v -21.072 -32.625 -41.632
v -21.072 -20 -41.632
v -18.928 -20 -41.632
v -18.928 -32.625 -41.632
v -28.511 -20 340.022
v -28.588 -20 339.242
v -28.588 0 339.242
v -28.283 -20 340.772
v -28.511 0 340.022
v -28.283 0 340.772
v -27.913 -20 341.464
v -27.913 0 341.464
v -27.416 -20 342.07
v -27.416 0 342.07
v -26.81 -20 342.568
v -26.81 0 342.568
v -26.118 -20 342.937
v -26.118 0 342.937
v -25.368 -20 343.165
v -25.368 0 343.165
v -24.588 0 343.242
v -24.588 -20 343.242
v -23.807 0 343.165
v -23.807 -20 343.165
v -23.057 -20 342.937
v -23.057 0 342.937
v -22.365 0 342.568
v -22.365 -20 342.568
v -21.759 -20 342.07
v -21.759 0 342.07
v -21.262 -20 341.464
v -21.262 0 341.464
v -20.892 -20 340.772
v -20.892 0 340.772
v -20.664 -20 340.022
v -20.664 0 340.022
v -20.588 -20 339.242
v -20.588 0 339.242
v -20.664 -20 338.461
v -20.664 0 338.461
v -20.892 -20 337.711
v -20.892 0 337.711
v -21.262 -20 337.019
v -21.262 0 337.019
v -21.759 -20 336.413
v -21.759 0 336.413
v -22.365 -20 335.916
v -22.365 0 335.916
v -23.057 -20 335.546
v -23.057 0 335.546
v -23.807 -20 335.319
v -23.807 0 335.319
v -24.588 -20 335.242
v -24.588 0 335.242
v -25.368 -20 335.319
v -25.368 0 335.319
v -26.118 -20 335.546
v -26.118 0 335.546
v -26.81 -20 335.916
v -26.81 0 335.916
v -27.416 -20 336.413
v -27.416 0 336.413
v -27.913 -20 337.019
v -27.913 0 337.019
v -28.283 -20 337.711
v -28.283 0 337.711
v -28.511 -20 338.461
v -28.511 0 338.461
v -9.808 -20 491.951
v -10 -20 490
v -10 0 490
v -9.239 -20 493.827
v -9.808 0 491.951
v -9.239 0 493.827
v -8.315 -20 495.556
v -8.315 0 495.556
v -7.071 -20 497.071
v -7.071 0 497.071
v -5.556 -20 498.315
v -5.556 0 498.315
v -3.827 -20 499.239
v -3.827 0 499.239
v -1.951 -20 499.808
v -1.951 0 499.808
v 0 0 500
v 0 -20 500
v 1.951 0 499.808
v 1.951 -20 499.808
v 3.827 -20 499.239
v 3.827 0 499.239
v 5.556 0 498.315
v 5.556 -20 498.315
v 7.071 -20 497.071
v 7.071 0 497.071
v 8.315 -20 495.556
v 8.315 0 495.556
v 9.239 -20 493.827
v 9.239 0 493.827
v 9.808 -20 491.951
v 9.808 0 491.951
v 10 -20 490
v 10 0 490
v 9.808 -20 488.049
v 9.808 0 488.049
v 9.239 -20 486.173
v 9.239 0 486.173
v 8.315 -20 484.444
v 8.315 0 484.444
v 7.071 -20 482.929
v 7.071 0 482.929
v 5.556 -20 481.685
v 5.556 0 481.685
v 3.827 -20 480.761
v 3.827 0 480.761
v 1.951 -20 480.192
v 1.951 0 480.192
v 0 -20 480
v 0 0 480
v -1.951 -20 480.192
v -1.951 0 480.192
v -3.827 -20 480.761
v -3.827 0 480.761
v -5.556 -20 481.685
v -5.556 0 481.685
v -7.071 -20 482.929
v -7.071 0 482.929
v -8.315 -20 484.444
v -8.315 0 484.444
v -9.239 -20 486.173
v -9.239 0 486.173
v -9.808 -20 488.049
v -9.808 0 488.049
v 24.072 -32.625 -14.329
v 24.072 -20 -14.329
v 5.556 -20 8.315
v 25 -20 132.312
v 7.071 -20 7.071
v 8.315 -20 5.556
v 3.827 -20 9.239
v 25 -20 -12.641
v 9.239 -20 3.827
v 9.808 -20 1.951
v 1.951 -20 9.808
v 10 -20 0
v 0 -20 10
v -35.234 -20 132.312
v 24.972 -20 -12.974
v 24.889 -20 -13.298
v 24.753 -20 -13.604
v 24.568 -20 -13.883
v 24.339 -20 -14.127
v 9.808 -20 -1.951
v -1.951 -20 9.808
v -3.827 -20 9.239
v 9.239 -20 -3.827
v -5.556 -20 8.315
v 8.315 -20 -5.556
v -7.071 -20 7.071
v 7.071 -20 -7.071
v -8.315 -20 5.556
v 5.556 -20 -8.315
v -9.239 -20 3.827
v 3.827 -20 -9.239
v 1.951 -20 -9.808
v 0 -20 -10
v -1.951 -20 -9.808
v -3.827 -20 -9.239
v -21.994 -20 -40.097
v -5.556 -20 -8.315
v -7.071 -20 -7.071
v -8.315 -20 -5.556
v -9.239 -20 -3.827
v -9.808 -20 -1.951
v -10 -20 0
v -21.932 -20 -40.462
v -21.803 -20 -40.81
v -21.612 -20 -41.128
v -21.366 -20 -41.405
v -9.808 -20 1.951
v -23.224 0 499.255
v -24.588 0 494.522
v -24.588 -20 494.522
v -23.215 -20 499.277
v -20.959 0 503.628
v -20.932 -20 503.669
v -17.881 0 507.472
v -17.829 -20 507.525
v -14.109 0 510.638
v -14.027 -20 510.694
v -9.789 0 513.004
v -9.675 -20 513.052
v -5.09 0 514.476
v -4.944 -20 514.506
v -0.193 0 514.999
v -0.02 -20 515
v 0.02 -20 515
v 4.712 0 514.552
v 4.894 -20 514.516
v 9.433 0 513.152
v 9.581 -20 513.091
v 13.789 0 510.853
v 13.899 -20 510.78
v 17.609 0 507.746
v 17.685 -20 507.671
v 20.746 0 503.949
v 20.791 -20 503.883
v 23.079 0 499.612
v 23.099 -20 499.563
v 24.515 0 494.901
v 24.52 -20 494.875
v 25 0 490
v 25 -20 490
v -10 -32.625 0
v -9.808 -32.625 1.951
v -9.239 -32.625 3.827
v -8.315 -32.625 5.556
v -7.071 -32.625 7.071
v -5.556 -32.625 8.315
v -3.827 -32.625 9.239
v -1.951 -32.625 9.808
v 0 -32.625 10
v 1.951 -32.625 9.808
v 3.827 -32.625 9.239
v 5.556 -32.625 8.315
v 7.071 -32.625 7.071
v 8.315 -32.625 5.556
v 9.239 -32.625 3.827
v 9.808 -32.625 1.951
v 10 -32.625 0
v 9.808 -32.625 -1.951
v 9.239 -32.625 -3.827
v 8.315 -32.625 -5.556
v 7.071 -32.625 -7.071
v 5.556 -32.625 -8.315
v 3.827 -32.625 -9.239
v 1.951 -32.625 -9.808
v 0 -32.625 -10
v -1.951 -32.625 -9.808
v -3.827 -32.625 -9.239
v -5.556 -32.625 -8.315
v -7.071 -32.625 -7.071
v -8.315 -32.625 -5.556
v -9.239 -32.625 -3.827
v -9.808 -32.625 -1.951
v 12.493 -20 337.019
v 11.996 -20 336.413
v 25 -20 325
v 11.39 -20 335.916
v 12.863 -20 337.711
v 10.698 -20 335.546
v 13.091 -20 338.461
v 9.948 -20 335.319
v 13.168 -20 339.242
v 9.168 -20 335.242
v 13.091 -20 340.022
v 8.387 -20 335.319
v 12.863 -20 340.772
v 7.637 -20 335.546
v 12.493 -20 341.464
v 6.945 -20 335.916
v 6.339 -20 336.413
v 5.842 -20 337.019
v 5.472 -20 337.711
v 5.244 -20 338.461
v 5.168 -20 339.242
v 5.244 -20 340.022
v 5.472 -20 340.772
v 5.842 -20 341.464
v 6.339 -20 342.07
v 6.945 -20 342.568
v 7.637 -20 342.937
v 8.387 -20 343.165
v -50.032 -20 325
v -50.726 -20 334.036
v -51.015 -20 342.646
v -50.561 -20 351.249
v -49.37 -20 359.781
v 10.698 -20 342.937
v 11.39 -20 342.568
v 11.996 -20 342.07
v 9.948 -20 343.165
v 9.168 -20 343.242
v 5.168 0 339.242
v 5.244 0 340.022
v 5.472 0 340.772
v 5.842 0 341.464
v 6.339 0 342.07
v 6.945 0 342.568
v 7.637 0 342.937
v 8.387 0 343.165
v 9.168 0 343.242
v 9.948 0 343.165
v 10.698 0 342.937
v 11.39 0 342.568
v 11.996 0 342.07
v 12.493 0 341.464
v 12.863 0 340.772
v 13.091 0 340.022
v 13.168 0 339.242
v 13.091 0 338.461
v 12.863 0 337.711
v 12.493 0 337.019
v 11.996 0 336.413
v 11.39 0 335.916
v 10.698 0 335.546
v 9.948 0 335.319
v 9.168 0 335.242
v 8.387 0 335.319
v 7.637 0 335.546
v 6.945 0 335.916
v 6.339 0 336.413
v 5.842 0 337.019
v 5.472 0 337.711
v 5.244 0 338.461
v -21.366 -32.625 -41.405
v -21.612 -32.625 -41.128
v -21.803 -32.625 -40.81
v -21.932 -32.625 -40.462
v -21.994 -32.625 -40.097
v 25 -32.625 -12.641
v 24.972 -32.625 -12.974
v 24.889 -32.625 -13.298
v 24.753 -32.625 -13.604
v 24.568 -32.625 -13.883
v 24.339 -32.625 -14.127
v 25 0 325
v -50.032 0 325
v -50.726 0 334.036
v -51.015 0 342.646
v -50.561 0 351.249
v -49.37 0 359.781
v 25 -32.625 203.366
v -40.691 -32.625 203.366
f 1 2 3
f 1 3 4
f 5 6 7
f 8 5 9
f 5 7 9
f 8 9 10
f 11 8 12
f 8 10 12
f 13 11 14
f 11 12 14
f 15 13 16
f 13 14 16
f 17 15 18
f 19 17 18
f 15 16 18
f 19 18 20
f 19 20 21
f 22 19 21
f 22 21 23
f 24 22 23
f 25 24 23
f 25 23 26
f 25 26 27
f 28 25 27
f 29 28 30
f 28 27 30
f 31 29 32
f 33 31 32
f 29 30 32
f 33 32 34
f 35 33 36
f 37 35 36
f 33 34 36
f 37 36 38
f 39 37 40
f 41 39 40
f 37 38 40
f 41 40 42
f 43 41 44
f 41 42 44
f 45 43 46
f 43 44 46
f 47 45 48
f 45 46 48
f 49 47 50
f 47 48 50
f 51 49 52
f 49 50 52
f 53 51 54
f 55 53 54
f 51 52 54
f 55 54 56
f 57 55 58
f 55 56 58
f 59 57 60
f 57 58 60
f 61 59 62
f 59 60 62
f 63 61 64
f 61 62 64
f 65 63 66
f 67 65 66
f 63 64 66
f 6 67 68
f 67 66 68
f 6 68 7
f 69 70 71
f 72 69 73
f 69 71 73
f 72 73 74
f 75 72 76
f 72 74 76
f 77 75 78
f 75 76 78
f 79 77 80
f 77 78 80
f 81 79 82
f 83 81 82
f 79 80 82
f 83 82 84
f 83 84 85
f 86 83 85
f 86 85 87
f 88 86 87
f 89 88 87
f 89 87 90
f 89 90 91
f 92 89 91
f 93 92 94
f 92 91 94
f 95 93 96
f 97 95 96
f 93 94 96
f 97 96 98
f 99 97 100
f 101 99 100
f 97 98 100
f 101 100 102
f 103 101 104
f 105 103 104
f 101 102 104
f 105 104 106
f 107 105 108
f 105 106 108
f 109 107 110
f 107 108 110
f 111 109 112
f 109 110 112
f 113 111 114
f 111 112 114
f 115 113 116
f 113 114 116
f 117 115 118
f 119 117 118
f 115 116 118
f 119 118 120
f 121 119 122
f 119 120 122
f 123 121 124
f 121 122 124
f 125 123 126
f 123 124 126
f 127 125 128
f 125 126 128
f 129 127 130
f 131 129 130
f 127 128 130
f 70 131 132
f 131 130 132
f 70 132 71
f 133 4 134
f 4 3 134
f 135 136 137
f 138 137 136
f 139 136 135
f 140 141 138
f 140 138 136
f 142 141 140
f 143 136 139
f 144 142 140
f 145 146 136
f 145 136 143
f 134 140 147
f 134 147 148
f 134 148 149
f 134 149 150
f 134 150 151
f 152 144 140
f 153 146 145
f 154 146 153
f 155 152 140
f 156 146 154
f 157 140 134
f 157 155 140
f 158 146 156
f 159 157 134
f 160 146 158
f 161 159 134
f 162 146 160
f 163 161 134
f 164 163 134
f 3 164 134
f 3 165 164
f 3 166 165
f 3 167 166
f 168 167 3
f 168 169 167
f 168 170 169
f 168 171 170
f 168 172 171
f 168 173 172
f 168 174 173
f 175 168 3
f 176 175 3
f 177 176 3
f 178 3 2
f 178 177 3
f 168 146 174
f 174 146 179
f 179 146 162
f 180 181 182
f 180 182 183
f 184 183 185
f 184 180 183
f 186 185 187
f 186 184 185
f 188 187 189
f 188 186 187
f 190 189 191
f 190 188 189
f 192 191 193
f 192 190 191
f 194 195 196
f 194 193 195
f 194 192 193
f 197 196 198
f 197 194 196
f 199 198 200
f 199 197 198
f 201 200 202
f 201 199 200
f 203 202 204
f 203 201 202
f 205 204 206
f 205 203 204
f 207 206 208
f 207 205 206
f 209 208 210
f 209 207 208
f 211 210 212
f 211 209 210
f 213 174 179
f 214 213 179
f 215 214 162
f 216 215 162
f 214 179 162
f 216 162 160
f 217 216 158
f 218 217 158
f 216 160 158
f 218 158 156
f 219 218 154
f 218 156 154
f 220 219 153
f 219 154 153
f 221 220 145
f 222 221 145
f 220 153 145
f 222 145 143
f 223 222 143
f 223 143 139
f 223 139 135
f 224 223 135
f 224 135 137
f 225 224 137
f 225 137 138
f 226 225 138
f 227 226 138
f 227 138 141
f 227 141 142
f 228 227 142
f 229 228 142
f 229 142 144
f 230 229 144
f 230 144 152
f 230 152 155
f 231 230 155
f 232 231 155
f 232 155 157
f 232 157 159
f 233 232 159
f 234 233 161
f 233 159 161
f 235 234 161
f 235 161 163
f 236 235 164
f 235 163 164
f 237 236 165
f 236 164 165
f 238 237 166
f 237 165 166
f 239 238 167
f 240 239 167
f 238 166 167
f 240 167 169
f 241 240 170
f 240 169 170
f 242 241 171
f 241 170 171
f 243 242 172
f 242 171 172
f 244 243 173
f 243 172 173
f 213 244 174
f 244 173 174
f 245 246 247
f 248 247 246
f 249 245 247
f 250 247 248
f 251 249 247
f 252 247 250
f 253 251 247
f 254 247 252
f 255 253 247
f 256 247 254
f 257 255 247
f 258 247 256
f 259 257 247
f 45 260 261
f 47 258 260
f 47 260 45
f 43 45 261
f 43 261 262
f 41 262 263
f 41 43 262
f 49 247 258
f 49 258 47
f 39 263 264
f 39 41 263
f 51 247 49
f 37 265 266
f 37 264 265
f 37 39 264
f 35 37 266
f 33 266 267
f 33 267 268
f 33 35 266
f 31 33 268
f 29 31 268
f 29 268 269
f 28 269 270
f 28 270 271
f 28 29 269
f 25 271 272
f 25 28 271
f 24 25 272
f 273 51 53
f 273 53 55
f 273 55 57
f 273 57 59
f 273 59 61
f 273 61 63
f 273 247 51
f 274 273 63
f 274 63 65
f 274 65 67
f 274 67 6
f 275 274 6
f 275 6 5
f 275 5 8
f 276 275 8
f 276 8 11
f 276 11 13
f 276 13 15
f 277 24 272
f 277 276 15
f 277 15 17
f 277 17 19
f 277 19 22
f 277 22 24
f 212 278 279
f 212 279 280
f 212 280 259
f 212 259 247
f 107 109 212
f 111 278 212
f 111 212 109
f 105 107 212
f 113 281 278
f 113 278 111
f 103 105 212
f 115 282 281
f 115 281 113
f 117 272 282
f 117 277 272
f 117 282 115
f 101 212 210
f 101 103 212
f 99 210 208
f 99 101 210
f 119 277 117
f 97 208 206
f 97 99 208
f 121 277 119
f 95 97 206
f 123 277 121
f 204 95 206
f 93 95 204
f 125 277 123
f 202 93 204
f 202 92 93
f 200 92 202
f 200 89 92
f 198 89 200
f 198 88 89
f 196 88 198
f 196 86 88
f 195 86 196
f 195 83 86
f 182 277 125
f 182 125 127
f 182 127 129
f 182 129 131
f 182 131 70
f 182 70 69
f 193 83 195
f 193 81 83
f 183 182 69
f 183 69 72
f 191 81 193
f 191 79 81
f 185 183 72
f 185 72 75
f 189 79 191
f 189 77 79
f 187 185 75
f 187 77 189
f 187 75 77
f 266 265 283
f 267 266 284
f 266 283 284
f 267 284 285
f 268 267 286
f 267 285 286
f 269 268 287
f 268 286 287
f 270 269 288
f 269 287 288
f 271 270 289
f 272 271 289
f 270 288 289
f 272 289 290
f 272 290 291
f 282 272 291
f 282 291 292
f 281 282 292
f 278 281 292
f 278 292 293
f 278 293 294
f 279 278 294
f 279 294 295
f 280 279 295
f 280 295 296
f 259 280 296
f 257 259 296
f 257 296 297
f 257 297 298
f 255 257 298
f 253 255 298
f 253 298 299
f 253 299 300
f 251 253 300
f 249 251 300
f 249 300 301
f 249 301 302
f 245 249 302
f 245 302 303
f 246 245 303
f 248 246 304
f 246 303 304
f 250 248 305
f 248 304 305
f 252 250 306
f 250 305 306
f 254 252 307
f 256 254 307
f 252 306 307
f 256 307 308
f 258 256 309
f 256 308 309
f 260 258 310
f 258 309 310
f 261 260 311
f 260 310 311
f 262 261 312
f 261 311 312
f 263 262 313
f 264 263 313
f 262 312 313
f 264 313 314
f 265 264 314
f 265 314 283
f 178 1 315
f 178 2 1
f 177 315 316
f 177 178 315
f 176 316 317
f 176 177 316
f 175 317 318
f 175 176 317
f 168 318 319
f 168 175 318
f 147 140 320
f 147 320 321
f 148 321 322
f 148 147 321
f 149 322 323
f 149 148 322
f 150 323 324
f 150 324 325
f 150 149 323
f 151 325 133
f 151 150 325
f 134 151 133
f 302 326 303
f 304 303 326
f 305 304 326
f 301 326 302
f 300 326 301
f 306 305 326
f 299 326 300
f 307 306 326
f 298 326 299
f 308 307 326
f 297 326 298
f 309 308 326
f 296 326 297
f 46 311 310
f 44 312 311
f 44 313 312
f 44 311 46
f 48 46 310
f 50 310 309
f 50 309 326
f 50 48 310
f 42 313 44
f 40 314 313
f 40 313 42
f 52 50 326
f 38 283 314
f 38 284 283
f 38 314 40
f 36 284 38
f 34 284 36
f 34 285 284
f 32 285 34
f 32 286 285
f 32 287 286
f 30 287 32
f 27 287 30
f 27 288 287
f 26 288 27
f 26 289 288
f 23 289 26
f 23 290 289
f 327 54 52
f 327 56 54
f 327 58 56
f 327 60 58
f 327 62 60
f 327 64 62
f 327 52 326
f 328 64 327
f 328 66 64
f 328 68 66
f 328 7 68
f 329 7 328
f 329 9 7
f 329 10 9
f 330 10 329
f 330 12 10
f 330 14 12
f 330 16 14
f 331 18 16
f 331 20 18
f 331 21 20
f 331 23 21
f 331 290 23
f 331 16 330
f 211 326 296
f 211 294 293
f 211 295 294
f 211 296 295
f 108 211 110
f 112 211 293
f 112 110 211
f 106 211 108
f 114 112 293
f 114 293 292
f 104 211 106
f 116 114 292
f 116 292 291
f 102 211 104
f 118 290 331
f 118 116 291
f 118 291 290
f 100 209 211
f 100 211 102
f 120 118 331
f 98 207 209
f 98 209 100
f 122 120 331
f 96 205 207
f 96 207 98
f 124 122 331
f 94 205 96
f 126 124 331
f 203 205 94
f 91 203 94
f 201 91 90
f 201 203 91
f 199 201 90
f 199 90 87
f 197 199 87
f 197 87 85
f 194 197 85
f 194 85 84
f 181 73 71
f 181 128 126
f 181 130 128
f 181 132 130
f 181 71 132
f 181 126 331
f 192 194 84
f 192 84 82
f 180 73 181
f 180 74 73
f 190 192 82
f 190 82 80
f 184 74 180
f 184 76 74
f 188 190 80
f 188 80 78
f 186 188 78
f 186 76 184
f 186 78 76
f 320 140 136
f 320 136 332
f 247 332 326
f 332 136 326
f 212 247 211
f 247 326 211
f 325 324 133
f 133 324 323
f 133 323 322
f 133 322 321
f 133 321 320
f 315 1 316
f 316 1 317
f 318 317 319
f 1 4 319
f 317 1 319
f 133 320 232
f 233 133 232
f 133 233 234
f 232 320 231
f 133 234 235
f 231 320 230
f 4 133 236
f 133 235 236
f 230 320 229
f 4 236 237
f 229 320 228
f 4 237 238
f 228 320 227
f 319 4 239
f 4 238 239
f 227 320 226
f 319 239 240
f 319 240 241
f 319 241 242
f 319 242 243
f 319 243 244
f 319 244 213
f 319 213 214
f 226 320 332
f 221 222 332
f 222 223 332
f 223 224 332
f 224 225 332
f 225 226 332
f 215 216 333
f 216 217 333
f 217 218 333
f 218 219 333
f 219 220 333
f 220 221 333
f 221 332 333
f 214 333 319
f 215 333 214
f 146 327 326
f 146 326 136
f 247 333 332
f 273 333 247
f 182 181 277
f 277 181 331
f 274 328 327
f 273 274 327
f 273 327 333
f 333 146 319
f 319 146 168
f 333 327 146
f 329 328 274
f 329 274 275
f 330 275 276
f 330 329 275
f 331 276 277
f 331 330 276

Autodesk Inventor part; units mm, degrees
ref_plane "YZ Plane" through (0, 0, 0) normal (1, 0, 0) x (0, 1, 0)
ref_plane "XZ Plane" through (0, 0, 0) normal (0, 1, 0) x (-1, 0, 0)
ref_plane "XY Plane" through (0, 0, 0) normal (0, 0, 1) x (1, 0, 0)
sketch "Sketch2" plane through (0, 0, 0) normal (0, 1, 0) x (-1, 0, 0)
  circle A0 centre (0, 490) radius 10
  circle A1 centre (0, 0) radius 10
  line L0 (24.5876, 494.5222) -> (49.3695, 359.7814)
  line L1 (50.7256, 334.0357) -> (21.9944, -40.0968)
  line L2 (18.9282, -41.6321) -> (-24.072, -14.3293)
  line L3 (-25, -12.6409) -> (-25, 490)
  arc A2 (24.5876, 494.5222) -> (-25, 490) centre (0, 490) ccw
  line L4 (0, -154.4311) -> (0, 629.0893) construction
  arc A3 (18.9282, -41.6321) -> (21.9944, -40.0968) centre (20.0003, -39.9437) ccw
  arc A4 (-25, -12.6409) -> (-24.072, -14.3293) centre (-23, -12.6409) ccw
  arc A5 (50.7256, 334.0357) -> (49.3695, 359.7814) centre (-48.9808, 341.6925) ccw
  line L5 (-17, 19.4683) -> (-17, 467.2676)
  line L6 (43.2667, 341.388) -> (18.4452, 18.1672)
  line L7 (15.4511, 16.5882) -> (5, 22.6222)
  line L8 (4, 24.3542) -> (4, 456.3028)
  line L9 (4.5133, 457.6406) -> (17.3407, 471.896)
  line L10 (-13.6891, 468.7781) -> (-4.6891, 460.9668)
  line L11 (-4, 459.4563) -> (-4, 27.5077)
  line L12 (-4.6676, 26.0162) -> (-13.6676, 17.9767)
  line L13 (-69.1212, 0) -> (71.8613, 0) construction
  line L14 (20.7944, 470.92) -> (42.7242, 351.6863)
  arc A6 (43.2667, 341.388) -> (42.7242, 351.6863) centre (3.3841, 344.4507) ccw
  arc A7 (-17, 19.4683) -> (-13.6676, 17.9767) centre (-15, 19.4683) ccw
  arc A8 (-4.6676, 26.0162) -> (-4, 27.5077) centre (-6, 27.5077) ccw
  arc A9 (4, 24.3542) -> (5, 22.6222) centre (6, 24.3542) ccw
  arc A10 (15.4511, 16.5882) -> (18.4452, 18.1672) centre (16.4511, 18.3203) ccw
  arc A11 (4.5133, 457.6406) -> (4, 456.3028) centre (6, 456.3028) ccw
  arc A12 (20.7944, 470.92) -> (17.3407, 471.896) centre (18.8274, 470.5582) ccw
  arc A13 (-13.6891, 468.7781) -> (-17, 467.2676) centre (-15, 467.2676) ccw
  arc A14 (-4, 459.4563) -> (-4.6891, 460.9668) centre (-6, 459.4563) ccw
  circle A15 centre (24.5876, 339.2417) radius 4
  circle A16 centre (-9.1676, 339.2417) radius 4
  point P0 (51.7209, 346.9967)
  point P1 (-17, 15)
  point P2 (18.202, 15)
  dimension "d0" = 20
  dimension "d1" = 20
  dimension "d2" = 490
  dimension "d3" = 15
  dimension "d4" = 10.421
  dimension "d6" = 25
  dimension "d7" = 25
  dimension "d8" = 25
  dimension "d9" = 150
  dimension "d10" = 2
  dimension "d11" = 100
  dimension "d14" = 15
  dimension "d15" = 15
  dimension "d16" = 8
  dimension "d18" = 8
  dimension "d19" = 8
  dimension "d20" = 60
  dimension "d21" = 40
  dimension "d22" = 8
  dimension "d23" = 25
  dimension "d24" = 25
  dimension "d25" = 2
  dimension "d28" = 8
extrude "Extrusion1" add sketch "Sketch2" against normal blind 32.625 contours L0 A5 L1 A3 L2 A4 L3 A2 | L5 A13 L10 A14 L11 A8 L12 A7 | L6 A10 L7 A9 L8 A11 L9 A12 L14 A6
extrude "Extrusion2" [suppressed]
sketch "Sketch3" plane through (0, 0, 0) normal (1, 0, 0) x (0, 1, 0)
  line L0 (0, -41.6321) -> (-32.625, -41.6321) construction
  line L1 (-32.625, 515) -> (-32.625, 490) construction
  line L2 (0, 490) -> (0, 515) construction
  line L3 (0, 515) -> (0, 325)
  line L4 (0, 325) -> (-20, 132.3117)
  line L5 (-20, 132.3117) -> (-20, -41.6321)
  line L6 (-20, -41.6321) -> (-40, -41.6321)
  line L7 (-40, -41.6321) -> (-40, 132.3117)
  line L8 (-40, 132.3117) -> (-20, 325)
  line L9 (-20, 325) -> (-20, 515)
  line L10 (-20, 515) -> (0, 515)
  point P0 (0, 0)
  point P1 (-32.625, 494.5222)
  point P2 (0, 494.5222)
  dimension "d11" = 100
  dimension "d29" = 20
  dimension "d30" = 190
  dimension "d31" = 20
extrude "Extrusion3" cut sketch "Sketch3" along normal through all both and the other way through all keep common part
equation "\"d1\" = d0"
equation "\"d6\" = 0.5 * d1 + d3"
equation "\"d7\" = d6"
equation "\"d8\" = d6"
equation "\"d15\" = d14"
equation "\"d18\" = d16"
equation "\"d19\" = d16"
equation "\"d22\" = d16"
equation "\"d23\" = 0.5 * d0 + d3"
equation "\"d24\" = d23"
properties part number "Profile_Straight" material "Aluminum 6061"
